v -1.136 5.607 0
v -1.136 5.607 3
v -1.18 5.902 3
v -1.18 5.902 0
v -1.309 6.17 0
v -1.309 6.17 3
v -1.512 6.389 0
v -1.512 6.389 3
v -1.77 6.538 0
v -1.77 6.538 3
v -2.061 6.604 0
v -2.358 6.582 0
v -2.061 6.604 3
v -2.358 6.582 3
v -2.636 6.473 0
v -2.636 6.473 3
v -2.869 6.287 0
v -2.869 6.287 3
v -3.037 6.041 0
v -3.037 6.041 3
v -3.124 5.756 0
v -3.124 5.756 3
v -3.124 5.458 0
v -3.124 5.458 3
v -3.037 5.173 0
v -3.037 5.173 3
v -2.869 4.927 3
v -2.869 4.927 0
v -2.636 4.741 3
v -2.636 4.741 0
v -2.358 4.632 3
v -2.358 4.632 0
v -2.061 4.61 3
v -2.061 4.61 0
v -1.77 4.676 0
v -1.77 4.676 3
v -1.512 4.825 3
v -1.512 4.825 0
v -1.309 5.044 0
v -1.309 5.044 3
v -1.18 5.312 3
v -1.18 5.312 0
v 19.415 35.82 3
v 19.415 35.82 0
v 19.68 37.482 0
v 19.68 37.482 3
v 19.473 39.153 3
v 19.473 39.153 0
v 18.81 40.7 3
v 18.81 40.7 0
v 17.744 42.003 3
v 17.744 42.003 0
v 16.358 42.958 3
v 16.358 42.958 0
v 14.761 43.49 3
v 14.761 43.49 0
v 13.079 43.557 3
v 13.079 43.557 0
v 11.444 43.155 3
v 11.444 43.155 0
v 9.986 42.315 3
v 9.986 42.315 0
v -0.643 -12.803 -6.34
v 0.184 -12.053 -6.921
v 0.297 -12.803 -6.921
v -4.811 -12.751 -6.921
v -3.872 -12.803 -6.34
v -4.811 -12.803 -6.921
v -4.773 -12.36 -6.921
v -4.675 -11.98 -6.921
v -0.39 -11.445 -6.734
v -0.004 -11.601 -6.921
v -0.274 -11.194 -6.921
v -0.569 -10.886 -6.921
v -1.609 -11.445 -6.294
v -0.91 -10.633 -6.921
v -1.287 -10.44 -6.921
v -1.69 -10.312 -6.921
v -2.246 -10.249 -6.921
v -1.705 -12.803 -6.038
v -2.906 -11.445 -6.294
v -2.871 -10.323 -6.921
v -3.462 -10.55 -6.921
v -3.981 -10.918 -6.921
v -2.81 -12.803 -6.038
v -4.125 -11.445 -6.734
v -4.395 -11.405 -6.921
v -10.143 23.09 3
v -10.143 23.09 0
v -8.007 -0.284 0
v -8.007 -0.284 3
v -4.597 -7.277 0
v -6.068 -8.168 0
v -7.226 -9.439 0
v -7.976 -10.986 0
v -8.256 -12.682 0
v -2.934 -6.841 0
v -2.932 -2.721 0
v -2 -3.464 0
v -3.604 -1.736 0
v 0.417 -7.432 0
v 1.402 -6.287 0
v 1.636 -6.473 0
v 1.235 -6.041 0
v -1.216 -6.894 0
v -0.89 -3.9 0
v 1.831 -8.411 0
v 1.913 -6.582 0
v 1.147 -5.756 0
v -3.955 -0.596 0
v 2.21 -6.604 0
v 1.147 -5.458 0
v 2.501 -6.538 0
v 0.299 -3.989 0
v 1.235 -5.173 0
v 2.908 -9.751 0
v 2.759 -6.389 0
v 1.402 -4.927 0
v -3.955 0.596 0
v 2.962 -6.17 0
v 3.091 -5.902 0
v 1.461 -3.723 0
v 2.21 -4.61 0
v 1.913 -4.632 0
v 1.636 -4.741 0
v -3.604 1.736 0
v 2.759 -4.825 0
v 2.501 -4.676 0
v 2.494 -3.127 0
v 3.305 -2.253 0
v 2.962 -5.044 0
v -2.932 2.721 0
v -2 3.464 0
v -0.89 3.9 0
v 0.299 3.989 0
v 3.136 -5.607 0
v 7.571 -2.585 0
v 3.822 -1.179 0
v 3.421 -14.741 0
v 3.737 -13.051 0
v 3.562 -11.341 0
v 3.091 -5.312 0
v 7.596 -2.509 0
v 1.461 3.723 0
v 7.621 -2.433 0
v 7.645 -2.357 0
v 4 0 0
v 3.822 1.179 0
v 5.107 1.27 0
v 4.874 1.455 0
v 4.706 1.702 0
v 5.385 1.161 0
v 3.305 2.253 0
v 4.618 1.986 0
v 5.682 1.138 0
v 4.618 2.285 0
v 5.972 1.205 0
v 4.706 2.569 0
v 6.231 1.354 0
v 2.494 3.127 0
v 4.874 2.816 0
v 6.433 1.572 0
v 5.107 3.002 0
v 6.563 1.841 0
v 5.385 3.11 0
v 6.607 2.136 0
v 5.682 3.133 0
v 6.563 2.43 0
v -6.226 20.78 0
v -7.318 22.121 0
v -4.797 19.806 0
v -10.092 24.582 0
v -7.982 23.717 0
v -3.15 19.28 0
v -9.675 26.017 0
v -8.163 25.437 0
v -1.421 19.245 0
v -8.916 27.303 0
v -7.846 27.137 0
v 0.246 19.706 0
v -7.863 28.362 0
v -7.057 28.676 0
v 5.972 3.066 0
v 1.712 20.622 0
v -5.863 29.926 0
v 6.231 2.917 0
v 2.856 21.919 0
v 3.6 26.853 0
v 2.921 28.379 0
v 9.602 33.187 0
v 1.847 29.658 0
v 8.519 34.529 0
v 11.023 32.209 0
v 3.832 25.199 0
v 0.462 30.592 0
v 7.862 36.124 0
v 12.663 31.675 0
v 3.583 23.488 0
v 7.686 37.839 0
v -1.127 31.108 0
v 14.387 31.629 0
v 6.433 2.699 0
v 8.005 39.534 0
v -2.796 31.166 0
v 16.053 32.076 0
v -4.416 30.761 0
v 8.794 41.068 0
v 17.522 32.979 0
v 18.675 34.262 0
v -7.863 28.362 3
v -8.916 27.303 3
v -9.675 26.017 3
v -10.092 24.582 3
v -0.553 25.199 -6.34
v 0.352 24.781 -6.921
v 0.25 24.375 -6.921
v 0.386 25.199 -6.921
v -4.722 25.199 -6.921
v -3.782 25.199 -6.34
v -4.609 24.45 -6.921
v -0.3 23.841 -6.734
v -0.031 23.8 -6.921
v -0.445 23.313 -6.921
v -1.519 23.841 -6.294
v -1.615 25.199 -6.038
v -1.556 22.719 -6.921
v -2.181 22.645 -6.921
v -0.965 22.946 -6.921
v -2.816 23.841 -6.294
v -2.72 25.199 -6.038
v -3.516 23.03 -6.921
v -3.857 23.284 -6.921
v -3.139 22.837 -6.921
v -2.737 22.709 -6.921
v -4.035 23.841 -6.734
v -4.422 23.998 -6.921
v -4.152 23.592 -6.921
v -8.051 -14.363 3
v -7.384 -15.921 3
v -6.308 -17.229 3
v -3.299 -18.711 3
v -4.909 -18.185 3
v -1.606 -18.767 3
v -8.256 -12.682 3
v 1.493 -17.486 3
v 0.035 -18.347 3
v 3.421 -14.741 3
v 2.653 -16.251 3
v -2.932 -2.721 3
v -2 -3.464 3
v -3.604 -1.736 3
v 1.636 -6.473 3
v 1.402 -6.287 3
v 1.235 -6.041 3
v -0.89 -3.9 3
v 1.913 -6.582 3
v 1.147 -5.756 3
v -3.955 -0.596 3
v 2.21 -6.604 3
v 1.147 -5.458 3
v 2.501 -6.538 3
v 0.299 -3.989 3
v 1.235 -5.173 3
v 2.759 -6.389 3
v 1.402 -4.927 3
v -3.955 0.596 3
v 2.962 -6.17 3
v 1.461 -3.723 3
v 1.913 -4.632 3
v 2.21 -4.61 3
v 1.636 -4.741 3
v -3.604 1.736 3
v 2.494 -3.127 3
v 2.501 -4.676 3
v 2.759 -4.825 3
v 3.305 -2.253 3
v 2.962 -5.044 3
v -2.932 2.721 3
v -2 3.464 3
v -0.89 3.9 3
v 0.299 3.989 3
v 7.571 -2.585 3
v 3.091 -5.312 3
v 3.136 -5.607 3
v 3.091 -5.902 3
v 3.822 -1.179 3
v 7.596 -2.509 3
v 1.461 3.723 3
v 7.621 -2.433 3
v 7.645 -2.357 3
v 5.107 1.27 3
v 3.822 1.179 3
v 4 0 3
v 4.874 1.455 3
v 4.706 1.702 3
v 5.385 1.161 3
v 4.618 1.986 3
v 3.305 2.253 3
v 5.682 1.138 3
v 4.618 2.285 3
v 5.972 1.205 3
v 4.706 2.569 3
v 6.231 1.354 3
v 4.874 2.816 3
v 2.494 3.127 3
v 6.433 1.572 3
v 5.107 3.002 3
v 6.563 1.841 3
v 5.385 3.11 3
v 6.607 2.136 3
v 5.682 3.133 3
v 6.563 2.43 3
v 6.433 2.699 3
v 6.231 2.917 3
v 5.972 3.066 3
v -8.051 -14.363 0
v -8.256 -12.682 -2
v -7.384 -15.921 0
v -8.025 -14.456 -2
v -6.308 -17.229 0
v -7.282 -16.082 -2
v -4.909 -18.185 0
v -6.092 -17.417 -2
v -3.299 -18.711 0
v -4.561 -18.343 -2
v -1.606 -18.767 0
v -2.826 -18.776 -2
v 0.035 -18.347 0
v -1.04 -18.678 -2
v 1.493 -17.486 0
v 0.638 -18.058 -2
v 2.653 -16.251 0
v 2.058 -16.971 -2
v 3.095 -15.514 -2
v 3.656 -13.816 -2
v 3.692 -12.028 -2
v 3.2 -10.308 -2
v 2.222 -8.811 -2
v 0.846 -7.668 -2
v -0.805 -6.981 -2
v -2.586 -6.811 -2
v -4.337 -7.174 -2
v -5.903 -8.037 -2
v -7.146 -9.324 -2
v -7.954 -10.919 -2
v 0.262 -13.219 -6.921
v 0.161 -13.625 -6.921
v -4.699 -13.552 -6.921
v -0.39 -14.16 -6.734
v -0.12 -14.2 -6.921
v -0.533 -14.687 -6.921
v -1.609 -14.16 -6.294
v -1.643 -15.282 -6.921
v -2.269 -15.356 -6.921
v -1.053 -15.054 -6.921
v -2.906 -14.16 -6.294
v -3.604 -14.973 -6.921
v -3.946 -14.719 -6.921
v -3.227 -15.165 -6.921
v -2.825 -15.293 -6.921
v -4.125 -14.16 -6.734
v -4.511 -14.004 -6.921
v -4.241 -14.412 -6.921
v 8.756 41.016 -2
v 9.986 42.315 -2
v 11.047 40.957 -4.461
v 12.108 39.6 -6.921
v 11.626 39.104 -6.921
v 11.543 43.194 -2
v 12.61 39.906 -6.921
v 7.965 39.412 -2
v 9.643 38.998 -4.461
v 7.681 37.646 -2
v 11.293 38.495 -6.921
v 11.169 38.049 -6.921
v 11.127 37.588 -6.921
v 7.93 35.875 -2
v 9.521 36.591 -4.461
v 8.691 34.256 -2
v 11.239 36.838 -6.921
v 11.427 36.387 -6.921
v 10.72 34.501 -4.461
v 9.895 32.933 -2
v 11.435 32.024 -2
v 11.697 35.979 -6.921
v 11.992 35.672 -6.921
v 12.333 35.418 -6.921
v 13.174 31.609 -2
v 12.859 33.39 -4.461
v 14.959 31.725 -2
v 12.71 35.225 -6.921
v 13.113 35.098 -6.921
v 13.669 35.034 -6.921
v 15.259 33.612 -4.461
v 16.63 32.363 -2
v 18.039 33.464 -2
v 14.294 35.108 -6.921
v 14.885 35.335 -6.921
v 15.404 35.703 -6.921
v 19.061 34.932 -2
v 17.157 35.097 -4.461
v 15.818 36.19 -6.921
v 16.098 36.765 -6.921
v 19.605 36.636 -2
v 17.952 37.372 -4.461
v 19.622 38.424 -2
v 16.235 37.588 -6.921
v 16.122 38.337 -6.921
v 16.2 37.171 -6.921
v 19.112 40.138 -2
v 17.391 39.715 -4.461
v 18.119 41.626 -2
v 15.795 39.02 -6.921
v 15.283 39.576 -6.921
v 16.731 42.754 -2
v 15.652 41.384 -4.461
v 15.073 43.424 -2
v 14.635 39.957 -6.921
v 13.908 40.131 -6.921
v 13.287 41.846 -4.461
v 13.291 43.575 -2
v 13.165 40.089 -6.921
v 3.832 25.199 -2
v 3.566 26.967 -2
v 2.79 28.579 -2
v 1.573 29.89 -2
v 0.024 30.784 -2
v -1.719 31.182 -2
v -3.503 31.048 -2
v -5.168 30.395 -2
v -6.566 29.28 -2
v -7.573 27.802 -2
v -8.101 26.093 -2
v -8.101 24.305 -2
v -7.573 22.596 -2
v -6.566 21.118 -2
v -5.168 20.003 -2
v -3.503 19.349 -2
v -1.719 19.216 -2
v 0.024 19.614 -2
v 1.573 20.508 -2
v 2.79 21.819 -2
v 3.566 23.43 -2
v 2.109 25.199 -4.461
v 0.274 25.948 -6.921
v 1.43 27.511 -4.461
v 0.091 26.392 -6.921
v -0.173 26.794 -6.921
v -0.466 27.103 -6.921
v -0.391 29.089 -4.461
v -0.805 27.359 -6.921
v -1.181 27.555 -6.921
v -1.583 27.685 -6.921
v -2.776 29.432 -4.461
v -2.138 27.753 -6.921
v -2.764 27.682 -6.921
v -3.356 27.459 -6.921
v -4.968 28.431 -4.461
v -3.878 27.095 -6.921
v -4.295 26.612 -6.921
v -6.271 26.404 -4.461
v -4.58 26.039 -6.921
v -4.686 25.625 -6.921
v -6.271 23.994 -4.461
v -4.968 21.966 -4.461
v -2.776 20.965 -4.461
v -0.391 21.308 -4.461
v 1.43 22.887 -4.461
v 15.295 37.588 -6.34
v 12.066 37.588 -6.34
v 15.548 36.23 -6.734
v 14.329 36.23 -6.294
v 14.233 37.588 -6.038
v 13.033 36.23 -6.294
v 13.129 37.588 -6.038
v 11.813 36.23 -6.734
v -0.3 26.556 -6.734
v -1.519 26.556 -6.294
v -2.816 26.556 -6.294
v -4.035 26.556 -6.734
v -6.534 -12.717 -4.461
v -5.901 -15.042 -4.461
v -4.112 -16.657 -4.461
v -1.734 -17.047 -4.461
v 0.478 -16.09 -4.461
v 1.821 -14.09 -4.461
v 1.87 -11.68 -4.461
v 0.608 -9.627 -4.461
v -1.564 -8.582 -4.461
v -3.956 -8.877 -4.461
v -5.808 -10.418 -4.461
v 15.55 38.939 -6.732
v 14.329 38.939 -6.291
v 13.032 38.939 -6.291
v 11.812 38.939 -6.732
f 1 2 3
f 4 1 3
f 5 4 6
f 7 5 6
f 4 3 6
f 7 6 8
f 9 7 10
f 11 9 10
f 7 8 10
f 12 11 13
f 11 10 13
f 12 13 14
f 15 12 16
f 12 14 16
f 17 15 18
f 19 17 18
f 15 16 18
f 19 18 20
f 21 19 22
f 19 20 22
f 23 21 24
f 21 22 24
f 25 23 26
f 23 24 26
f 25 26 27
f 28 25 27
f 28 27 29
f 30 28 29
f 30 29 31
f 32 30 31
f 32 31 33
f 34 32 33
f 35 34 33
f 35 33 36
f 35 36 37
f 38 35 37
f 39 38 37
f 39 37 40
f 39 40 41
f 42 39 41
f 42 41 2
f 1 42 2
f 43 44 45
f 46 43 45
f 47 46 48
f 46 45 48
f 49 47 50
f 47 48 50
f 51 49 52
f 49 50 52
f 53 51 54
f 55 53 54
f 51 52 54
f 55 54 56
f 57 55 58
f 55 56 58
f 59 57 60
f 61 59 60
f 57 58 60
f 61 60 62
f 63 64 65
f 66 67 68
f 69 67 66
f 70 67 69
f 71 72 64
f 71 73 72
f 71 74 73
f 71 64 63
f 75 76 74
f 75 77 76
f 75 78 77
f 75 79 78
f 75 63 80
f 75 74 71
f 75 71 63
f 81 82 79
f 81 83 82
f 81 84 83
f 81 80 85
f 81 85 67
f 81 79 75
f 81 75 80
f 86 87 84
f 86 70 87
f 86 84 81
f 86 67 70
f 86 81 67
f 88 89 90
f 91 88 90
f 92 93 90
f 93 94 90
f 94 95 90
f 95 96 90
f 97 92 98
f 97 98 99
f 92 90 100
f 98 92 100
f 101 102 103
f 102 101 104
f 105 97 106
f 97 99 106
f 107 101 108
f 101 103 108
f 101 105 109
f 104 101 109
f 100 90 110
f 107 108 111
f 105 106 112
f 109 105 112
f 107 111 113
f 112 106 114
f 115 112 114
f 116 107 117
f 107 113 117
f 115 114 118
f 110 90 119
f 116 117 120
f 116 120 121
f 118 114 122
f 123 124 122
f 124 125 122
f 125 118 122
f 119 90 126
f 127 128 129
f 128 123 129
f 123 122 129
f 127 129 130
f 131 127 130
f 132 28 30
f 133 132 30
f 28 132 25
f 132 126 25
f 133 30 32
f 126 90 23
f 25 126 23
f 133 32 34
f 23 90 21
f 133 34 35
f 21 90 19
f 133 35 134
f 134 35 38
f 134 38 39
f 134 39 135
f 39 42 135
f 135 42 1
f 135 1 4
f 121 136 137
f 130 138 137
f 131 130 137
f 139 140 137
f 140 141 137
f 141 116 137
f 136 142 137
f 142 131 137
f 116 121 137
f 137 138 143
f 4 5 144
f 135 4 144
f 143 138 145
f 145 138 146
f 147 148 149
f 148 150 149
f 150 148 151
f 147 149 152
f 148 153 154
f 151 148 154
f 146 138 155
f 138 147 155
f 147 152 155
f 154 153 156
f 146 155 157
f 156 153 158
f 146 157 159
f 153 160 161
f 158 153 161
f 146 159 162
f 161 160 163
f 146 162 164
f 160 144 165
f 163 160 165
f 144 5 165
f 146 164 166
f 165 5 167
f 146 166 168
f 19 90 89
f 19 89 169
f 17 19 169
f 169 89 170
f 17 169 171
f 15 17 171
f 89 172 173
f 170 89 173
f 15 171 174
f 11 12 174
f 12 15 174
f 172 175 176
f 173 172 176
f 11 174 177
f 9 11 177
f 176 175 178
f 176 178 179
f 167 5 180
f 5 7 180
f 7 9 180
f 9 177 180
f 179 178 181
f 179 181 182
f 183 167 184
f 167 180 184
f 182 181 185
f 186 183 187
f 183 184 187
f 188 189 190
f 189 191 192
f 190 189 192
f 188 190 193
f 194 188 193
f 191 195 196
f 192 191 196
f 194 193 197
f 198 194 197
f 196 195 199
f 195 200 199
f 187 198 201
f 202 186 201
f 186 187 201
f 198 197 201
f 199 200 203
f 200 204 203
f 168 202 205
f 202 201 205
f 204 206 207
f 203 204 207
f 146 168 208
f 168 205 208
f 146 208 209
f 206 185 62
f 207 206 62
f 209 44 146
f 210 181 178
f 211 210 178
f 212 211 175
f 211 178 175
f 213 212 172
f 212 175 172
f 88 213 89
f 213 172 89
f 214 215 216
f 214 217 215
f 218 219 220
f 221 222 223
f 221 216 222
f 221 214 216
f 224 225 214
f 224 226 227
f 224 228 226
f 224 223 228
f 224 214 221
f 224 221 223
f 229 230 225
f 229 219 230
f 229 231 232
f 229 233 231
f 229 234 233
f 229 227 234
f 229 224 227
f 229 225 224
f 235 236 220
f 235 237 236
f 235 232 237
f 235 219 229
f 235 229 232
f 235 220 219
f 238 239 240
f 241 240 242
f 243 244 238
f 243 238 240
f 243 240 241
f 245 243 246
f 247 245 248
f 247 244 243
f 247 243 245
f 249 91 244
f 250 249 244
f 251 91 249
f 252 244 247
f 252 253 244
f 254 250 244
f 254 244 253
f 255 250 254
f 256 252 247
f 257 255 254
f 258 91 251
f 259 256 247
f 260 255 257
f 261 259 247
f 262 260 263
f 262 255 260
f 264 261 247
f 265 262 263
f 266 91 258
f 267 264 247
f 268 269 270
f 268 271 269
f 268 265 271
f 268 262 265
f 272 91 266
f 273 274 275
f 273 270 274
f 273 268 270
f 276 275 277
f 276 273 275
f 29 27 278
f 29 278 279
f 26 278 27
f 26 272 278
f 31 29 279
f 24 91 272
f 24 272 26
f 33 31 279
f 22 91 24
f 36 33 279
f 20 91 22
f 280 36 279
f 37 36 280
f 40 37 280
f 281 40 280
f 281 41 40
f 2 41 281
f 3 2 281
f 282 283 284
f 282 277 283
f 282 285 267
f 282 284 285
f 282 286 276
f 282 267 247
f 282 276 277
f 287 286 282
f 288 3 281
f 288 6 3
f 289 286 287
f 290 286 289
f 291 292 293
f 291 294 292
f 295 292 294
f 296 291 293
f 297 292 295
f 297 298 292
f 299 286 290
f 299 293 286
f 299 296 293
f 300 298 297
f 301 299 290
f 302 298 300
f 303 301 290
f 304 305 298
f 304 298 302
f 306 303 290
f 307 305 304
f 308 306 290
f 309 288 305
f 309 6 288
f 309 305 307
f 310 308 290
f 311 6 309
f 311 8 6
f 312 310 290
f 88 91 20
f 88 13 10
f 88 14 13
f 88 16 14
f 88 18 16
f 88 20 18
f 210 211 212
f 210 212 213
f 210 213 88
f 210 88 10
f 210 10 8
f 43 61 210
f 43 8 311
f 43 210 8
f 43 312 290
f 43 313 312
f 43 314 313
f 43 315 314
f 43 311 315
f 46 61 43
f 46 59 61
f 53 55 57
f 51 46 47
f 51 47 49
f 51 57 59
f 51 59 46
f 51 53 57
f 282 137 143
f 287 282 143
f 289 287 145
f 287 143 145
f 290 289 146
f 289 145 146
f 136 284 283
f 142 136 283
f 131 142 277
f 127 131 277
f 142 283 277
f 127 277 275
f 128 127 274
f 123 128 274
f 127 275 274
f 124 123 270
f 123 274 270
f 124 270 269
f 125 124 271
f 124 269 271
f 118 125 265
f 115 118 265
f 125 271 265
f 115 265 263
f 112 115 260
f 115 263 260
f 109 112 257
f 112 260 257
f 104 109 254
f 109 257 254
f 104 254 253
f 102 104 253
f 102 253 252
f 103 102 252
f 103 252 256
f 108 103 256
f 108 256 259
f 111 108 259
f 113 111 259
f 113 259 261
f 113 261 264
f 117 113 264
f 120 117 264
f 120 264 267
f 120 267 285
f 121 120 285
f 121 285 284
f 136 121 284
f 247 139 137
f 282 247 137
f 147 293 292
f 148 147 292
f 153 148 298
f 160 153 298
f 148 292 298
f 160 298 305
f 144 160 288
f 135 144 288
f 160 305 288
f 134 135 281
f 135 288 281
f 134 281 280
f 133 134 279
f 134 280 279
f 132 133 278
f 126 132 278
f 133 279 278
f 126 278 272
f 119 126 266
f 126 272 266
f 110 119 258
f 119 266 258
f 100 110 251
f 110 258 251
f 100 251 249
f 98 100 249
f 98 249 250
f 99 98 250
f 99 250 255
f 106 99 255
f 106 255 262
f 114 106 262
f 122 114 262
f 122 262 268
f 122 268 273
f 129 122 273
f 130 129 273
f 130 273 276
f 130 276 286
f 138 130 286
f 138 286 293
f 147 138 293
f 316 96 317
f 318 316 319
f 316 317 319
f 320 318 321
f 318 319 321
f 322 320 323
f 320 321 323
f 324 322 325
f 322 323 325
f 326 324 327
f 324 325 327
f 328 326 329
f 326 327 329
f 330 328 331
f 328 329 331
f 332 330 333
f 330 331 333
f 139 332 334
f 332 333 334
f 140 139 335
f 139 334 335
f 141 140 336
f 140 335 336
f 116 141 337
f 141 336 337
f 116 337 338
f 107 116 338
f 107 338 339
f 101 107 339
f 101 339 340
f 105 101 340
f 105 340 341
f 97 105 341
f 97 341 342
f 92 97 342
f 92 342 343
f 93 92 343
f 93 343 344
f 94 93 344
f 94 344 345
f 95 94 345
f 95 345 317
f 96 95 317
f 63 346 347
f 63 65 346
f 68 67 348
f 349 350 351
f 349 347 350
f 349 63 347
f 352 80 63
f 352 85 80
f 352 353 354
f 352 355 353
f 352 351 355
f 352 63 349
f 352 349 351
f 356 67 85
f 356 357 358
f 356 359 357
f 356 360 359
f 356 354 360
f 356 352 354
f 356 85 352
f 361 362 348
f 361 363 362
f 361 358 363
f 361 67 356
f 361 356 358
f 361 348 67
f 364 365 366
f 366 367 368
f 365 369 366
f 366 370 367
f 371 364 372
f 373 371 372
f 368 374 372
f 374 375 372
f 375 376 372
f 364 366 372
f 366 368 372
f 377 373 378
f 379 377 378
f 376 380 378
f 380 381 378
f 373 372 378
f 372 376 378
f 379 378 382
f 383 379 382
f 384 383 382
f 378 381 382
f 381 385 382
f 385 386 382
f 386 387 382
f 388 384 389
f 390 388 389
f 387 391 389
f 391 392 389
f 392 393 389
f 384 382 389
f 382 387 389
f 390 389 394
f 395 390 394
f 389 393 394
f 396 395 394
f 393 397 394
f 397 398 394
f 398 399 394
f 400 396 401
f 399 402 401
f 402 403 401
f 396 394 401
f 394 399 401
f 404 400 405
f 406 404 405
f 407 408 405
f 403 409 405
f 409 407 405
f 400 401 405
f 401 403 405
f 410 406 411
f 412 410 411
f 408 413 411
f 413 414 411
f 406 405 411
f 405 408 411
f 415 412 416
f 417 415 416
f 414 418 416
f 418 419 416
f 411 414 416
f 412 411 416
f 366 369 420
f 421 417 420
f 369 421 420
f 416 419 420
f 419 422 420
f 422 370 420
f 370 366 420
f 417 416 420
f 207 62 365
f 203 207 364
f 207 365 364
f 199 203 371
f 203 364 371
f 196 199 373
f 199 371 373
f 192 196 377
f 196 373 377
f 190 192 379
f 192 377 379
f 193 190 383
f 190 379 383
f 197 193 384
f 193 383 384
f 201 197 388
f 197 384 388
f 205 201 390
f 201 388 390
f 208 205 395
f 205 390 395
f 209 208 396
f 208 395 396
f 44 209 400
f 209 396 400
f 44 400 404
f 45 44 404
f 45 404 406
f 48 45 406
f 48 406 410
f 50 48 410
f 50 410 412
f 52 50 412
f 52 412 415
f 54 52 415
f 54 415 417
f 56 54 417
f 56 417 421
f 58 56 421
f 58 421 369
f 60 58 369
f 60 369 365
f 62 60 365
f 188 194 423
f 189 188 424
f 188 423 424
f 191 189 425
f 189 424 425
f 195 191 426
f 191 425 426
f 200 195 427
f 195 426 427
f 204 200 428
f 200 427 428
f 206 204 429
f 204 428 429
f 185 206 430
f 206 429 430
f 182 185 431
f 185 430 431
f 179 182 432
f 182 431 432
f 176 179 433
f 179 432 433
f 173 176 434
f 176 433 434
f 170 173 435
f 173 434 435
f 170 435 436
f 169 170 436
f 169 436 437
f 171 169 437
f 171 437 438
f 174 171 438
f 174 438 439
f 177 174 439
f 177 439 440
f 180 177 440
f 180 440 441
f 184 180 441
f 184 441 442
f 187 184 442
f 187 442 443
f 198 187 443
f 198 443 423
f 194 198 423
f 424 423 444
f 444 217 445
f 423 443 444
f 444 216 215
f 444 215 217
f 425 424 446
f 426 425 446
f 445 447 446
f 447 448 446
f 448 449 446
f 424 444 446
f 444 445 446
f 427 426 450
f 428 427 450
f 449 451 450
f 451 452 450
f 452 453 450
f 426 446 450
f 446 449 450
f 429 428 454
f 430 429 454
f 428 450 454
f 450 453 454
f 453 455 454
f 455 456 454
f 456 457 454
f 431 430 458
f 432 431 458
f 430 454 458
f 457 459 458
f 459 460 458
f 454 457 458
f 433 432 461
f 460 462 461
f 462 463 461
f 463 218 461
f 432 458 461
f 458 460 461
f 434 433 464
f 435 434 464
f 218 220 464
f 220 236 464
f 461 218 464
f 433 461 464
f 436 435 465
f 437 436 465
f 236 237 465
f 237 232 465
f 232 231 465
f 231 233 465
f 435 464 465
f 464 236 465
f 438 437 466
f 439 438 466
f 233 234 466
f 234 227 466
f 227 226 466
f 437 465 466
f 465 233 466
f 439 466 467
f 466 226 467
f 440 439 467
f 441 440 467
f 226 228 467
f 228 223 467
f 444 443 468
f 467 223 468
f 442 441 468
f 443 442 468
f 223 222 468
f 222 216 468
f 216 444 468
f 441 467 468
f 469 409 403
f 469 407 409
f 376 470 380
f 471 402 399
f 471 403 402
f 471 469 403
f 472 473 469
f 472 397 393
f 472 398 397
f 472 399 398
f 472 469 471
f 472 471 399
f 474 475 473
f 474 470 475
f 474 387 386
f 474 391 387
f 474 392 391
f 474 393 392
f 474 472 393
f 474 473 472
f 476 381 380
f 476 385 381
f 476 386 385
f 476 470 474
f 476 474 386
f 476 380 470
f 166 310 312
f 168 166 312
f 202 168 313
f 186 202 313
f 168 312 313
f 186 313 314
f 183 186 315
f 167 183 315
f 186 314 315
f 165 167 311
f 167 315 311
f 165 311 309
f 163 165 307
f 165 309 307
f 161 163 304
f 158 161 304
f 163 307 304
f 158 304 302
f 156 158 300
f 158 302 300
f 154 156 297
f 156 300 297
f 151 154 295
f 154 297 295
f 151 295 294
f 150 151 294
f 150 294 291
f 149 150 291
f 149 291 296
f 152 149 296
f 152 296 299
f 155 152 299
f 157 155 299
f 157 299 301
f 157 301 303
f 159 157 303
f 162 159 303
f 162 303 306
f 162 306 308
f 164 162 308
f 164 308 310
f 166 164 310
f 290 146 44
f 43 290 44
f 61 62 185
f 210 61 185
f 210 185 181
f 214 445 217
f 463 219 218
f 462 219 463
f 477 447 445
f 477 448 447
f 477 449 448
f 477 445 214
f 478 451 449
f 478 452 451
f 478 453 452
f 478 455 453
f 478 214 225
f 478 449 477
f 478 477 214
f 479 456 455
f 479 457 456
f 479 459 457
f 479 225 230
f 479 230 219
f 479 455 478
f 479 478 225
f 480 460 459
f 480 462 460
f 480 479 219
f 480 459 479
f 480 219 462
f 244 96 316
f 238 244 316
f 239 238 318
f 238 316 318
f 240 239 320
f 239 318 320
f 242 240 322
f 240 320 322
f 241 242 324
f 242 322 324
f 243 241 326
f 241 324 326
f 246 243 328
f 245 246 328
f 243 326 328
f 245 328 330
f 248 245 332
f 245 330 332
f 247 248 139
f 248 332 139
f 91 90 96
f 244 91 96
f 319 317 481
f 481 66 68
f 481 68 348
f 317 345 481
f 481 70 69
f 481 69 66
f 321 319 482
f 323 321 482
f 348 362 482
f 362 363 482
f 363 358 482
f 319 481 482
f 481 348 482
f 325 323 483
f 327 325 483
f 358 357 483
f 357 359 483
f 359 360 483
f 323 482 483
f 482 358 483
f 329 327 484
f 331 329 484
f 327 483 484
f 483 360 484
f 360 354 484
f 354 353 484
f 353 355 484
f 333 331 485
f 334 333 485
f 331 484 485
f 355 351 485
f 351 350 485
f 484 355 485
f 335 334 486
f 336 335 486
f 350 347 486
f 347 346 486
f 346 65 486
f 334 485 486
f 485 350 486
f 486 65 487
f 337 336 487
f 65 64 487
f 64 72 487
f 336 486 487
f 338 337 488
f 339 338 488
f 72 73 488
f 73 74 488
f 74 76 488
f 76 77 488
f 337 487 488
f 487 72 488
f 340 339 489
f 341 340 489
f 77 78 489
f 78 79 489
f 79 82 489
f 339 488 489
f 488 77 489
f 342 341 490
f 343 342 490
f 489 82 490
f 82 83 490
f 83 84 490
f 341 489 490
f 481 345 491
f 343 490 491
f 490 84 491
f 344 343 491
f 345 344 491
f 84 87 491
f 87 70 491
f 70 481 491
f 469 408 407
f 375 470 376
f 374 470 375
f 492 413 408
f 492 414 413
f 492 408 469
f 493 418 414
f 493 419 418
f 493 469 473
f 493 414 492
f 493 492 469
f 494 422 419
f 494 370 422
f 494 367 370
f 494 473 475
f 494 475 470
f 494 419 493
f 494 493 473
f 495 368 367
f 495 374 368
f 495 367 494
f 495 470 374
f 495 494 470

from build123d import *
from build123d.topology import SkipClean

# Parameters (mm, degrees)
BOSS_EXTRUDE1_DEPTH = 3
BOSS_EXTRUDE2_DEPTH = 3
SKETCH3_R           = 4
CUT_EXTRUDE1_DEPTH  = 50
SKETCH4_R           = 1
CUT_EXTRUDE2_DEPTH  = 10
BOSS_EXTRUDE3_START = -7
SKETCH1_4_R         = 6
BOSS_EXTRUDE3_DEPTH = 7
BOSS_EXTRUDE4_START = -7
SKETCH2_4_R         = 6
BOSS_EXTRUDE4_DEPTH = 7
CHAMFER1_SIZE       = 5
CHAMFER1_SIZE_2     = 3.501037691


with BuildPart() as part:
    # Sketch1 → Boss-Extrude1 (new body)
    with BuildSketch(Plane.XY):
        with BuildLine():
            ThreePointArc((-7.862783113, 28.36246747), (-9.674812704, 26.016588816), (-10.142674299, 23.089524856))
            Line((-10.142674299, 23.089524856), (-7.966824047, -0.727814955))
            ThreePointArc((-7.966824047, -0.727814955), (-0.830270862, -7.956798998), (7.644946217, -2.356861757))
            Line((7.644946217, -2.356861757), (19.414515396, 35.820058514))
            ThreePointArc((19.414515396, 35.820058514), (17.084366379, 42.528936958), (9.985578884, 42.314786229))
            Line((9.985578884, 42.314786229), (-7.862783113, 28.36246747))
        make_face()
    extrude(amount=BOSS_EXTRUDE1_DEPTH)

    # Sketch2 → Boss-Extrude2 (add)
    with BuildSketch(Plane.XY):
        with BuildLine():
            Line((-7.9983883, 0.16057583), (-8.256217535, -12.682068917))
            ThreePointArc((-8.256217535, -12.682068917), (-3.299315376, -18.711347307), (3.420783665, -14.741039282))
            Line((3.420783665, -14.741039282), (7.570946632, -2.584717991))
            ThreePointArc((7.570946632, -2.584717991), (-1.389185421, -7.878462024), (-7.9983883, 0.16057583))
        make_face()
    extrude(amount=BOSS_EXTRUDE2_DEPTH)

    # Sketch3 → Cut-Extrude1 (cut)
    with BuildSketch(Plane.XY.offset(3)):
        Circle(SKETCH3_R)
    extrude(amount=-CUT_EXTRUDE1_DEPTH, mode=Mode.SUBTRACT)

    # Sketch4 → Cut-Extrude2 (cut)
    with BuildSketch(Plane.XY.offset(3)):
        with Locations((2.135535698, -5.607092587)):
            Circle(SKETCH4_R)
        with Locations((-2.135535698, 5.607092587)):
            Circle(SKETCH4_R)
        with Locations((5.607092587, 2.135535698)):
            Circle(SKETCH4_R)
    extrude(amount=-CUT_EXTRUDE2_DEPTH, mode=Mode.SUBTRACT)

    # Sketch1<4> → Boss-Extrude3 (add)
    with SkipClean():  # the faces are left unmerged after this step: merging them gives an invalid solid
        with BuildSketch(Plane.XY.offset(BOSS_EXTRUDE3_START)):
            with Locations(Location((13.680805733, 37.587704831, 0), (0, 0, 128.01524628))):
                Circle(SKETCH1_4_R)
            with Locations((-2.167556264, 25.198814555)):
                Circle(SKETCH1_4_R)
        extrude(amount=BOSS_EXTRUDE3_DEPTH)

    # Sketch2<4> → Boss-Extrude4 (add)
    with SkipClean():  # the faces are left unmerged after this step: merging them gives an invalid solid
        with BuildSketch(Plane.XY.offset(BOSS_EXTRUDE4_START)):
            with Locations(Location((-2.25742631, -12.802500789, 0), (0, 0, 178.849883098))):
                Circle(SKETCH2_4_R)
        extrude(amount=BOSS_EXTRUDE4_DEPTH)

    # Sketch5 one side → Cut-Revolve1 (revolve, cut)
    with SkipClean():  # the faces are left unmerged after this step: merging them gives an invalid solid
        with BuildSketch(Plane(origin=(13.680805733, 0, 0), x_dir=(0, 0, -1), z_dir=(1, 0, 0))):
            with BuildLine():
                ThreePointArc((10, 33.587704831), (12.828427125, 34.759277707), (14, 37.587704831))
                ThreePointArc((14, 37.587704831), (12.828427125, 40.416131956), (10, 41.587704831))
                Line((10, 41.587704831), (10, 33.587704831))
            make_face()
        revolve(axis=Axis((13.680805733, 41.587704831, -10), (0, -1, 0)), mode=Mode.SUBTRACT)

    # Sketch6 → Cut-Revolve2 (revolve, cut)
    with SkipClean():  # the faces are left unmerged after this step: merging them gives an invalid solid
        with BuildSketch(Plane(origin=(-2.167556264, 0, 0), x_dir=(0, 0, -1), z_dir=(1, 0, 0))):
            with BuildLine():
                ThreePointArc((14, 25.198814555), (12.828427125, 28.02724168), (10, 29.198814555))
                Line((10, 29.198814555), (10, 21.198814555))
                ThreePointArc((10, 21.198814555), (12.828427125, 22.37038743), (14, 25.198814555))
            make_face()
            with BuildLine():
                Line((10, 21.198814555), (10, 29.198814555))
                ThreePointArc((10, 29.198814555), (6, 25.198814555), (10, 21.198814555))
            make_face()
        revolve(axis=Axis((-2.167556264, 29.198814555, -10), (0, -1, 0)), mode=Mode.SUBTRACT)

    # Sketch7 → Cut-Revolve3 (revolve, cut)
    with SkipClean():  # the faces are left unmerged after this step: merging them gives an invalid solid
        with BuildSketch(Plane(origin=(-2.25742631, 0, 0), x_dir=(0, 0, -1), z_dir=(1, 0, 0))):
            with BuildLine():
                ThreePointArc((14, -12.802500789), (12.828427125, -9.974073664), (10, -8.802500789))
                Line((10, -8.802500789), (10, -16.802500789))
                ThreePointArc((10, -16.802500789), (12.828427125, -15.630927914), (14, -12.802500789))
            make_face()
            with BuildLine():
                Line((10, -16.802500789), (10, -8.802500789))
                ThreePointArc((10, -8.802500789), (6, -12.802500789), (10, -16.802500789))
            make_face()
        revolve(axis=Axis((-2.25742631, -8.802500789, -10), (0, -1, 0)), mode=Mode.SUBTRACT)

    # Chamfer1
    # the kernel refuses this chamfer: 5, 3.501037691 mm, written as the material it takes off along each edge
    with BuildSketch(Plane(origin=(-2.25742631, -12.802500789, -7), x_dir=(-0.9997985375420249, 0.020071978697384193, 0), z_dir=(0.020071978697384193, 0.9997985375420249, 0))) as chamfer1_piece_1:
        Polygon((6, CHAMFER1_SIZE), (6 - CHAMFER1_SIZE_2, 0), (6, 0), align=None)
    revolve(axis=Axis((-2.25742631, -12.802500789, -7), (0, 0, 1)), mode=Mode.SUBTRACT)
    with BuildSketch(Plane(origin=(13.680805733, 37.587704831, -7), x_dir=(-0.615871141442135, 0.7878468995552129, 0), z_dir=(0.7878468995552129, 0.615871141442135, 0))) as chamfer1_piece_2:
        Polygon((6, CHAMFER1_SIZE), (6 - CHAMFER1_SIZE_2, 0), (6, 0), align=None)
    revolve(axis=Axis((13.680805733, 37.587704831, -7), (0, 0, 1)), mode=Mode.SUBTRACT)
    with BuildSketch(Plane(origin=(-2.167556264, 25.198814555, -7), x_dir=(1, 0, 0), z_dir=(0, -1, 0))) as chamfer1_piece_3:
        Polygon((6, CHAMFER1_SIZE), (6 - CHAMFER1_SIZE_2, 0), (6, 0), align=None)
    revolve(axis=Axis((-2.167556264, 25.198814555, -7), (0, 0, 1)), mode=Mode.SUBTRACT)


solid = part.part
